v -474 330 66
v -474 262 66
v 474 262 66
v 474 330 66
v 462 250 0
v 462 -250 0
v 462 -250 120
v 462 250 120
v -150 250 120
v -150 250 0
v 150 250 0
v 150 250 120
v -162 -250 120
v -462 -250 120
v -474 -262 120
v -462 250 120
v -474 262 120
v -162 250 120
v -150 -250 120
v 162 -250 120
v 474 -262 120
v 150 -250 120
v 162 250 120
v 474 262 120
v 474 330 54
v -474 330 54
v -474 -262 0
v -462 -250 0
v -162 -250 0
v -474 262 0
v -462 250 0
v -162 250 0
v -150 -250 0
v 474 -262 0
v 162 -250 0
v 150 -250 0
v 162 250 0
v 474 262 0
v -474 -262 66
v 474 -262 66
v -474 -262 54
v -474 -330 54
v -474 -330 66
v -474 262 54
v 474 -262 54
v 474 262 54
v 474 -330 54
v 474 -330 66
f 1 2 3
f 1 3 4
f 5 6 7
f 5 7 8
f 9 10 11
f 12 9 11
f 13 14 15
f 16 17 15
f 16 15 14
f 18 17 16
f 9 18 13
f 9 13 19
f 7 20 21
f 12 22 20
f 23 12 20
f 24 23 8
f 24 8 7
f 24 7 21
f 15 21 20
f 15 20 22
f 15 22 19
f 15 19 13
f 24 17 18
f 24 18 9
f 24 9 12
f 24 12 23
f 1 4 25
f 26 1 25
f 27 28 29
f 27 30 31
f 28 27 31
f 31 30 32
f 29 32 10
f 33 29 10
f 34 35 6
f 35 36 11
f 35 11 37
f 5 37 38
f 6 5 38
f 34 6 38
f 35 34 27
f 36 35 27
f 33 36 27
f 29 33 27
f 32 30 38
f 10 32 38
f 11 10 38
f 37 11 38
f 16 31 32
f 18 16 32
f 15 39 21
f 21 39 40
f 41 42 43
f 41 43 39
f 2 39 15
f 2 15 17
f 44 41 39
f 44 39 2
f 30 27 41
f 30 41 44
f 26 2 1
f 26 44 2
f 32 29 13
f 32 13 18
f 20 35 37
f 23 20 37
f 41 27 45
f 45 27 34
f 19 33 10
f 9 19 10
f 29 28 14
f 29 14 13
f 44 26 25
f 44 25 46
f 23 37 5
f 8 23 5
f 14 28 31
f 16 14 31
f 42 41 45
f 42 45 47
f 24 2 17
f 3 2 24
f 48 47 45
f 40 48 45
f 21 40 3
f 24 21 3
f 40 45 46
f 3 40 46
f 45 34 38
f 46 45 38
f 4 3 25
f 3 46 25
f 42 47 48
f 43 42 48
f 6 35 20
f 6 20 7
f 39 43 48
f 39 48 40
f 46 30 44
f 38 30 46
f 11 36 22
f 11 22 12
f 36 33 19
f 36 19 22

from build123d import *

# Parameters (mm, degrees)
F0_W     = 948
F0_H     = 524
F0_W_2   = 300
F0_H_2   = 500
F1_DEPTH = 120
F3_DEPTH = 948


with BuildPart() as f1:
    # F0 (on Top) → F1 (new body)
    with BuildSketch(Plane.XY):
        Rectangle(F0_W, F0_H)
        with Locations((-312, 0)):
            Rectangle(F0_W_2, F0_H_2, mode=Mode.SUBTRACT)
        Rectangle(F0_W_2, F0_H_2, mode=Mode.SUBTRACT)
        with Locations((312, 0)):
            Rectangle(F0_W_2, F0_H_2, mode=Mode.SUBTRACT)
    extrude(amount=F1_DEPTH)

    # F2 (on face) → F3 (join, through all)
    with BuildSketch(Plane(origin=(-474, 0, 0), x_dir=(0, -1, 0), z_dir=(-1, 0, 0))):
        Polygon((-330, 54), (-262, 54), (-262, 66), (-330, 66), (-330, 60), align=None)
        Polygon((262, 66), (262, 54), (330, 54), (330, 60), (330, 66), align=None)
    extrude(amount=-F3_DEPTH)


solid = f1.part
